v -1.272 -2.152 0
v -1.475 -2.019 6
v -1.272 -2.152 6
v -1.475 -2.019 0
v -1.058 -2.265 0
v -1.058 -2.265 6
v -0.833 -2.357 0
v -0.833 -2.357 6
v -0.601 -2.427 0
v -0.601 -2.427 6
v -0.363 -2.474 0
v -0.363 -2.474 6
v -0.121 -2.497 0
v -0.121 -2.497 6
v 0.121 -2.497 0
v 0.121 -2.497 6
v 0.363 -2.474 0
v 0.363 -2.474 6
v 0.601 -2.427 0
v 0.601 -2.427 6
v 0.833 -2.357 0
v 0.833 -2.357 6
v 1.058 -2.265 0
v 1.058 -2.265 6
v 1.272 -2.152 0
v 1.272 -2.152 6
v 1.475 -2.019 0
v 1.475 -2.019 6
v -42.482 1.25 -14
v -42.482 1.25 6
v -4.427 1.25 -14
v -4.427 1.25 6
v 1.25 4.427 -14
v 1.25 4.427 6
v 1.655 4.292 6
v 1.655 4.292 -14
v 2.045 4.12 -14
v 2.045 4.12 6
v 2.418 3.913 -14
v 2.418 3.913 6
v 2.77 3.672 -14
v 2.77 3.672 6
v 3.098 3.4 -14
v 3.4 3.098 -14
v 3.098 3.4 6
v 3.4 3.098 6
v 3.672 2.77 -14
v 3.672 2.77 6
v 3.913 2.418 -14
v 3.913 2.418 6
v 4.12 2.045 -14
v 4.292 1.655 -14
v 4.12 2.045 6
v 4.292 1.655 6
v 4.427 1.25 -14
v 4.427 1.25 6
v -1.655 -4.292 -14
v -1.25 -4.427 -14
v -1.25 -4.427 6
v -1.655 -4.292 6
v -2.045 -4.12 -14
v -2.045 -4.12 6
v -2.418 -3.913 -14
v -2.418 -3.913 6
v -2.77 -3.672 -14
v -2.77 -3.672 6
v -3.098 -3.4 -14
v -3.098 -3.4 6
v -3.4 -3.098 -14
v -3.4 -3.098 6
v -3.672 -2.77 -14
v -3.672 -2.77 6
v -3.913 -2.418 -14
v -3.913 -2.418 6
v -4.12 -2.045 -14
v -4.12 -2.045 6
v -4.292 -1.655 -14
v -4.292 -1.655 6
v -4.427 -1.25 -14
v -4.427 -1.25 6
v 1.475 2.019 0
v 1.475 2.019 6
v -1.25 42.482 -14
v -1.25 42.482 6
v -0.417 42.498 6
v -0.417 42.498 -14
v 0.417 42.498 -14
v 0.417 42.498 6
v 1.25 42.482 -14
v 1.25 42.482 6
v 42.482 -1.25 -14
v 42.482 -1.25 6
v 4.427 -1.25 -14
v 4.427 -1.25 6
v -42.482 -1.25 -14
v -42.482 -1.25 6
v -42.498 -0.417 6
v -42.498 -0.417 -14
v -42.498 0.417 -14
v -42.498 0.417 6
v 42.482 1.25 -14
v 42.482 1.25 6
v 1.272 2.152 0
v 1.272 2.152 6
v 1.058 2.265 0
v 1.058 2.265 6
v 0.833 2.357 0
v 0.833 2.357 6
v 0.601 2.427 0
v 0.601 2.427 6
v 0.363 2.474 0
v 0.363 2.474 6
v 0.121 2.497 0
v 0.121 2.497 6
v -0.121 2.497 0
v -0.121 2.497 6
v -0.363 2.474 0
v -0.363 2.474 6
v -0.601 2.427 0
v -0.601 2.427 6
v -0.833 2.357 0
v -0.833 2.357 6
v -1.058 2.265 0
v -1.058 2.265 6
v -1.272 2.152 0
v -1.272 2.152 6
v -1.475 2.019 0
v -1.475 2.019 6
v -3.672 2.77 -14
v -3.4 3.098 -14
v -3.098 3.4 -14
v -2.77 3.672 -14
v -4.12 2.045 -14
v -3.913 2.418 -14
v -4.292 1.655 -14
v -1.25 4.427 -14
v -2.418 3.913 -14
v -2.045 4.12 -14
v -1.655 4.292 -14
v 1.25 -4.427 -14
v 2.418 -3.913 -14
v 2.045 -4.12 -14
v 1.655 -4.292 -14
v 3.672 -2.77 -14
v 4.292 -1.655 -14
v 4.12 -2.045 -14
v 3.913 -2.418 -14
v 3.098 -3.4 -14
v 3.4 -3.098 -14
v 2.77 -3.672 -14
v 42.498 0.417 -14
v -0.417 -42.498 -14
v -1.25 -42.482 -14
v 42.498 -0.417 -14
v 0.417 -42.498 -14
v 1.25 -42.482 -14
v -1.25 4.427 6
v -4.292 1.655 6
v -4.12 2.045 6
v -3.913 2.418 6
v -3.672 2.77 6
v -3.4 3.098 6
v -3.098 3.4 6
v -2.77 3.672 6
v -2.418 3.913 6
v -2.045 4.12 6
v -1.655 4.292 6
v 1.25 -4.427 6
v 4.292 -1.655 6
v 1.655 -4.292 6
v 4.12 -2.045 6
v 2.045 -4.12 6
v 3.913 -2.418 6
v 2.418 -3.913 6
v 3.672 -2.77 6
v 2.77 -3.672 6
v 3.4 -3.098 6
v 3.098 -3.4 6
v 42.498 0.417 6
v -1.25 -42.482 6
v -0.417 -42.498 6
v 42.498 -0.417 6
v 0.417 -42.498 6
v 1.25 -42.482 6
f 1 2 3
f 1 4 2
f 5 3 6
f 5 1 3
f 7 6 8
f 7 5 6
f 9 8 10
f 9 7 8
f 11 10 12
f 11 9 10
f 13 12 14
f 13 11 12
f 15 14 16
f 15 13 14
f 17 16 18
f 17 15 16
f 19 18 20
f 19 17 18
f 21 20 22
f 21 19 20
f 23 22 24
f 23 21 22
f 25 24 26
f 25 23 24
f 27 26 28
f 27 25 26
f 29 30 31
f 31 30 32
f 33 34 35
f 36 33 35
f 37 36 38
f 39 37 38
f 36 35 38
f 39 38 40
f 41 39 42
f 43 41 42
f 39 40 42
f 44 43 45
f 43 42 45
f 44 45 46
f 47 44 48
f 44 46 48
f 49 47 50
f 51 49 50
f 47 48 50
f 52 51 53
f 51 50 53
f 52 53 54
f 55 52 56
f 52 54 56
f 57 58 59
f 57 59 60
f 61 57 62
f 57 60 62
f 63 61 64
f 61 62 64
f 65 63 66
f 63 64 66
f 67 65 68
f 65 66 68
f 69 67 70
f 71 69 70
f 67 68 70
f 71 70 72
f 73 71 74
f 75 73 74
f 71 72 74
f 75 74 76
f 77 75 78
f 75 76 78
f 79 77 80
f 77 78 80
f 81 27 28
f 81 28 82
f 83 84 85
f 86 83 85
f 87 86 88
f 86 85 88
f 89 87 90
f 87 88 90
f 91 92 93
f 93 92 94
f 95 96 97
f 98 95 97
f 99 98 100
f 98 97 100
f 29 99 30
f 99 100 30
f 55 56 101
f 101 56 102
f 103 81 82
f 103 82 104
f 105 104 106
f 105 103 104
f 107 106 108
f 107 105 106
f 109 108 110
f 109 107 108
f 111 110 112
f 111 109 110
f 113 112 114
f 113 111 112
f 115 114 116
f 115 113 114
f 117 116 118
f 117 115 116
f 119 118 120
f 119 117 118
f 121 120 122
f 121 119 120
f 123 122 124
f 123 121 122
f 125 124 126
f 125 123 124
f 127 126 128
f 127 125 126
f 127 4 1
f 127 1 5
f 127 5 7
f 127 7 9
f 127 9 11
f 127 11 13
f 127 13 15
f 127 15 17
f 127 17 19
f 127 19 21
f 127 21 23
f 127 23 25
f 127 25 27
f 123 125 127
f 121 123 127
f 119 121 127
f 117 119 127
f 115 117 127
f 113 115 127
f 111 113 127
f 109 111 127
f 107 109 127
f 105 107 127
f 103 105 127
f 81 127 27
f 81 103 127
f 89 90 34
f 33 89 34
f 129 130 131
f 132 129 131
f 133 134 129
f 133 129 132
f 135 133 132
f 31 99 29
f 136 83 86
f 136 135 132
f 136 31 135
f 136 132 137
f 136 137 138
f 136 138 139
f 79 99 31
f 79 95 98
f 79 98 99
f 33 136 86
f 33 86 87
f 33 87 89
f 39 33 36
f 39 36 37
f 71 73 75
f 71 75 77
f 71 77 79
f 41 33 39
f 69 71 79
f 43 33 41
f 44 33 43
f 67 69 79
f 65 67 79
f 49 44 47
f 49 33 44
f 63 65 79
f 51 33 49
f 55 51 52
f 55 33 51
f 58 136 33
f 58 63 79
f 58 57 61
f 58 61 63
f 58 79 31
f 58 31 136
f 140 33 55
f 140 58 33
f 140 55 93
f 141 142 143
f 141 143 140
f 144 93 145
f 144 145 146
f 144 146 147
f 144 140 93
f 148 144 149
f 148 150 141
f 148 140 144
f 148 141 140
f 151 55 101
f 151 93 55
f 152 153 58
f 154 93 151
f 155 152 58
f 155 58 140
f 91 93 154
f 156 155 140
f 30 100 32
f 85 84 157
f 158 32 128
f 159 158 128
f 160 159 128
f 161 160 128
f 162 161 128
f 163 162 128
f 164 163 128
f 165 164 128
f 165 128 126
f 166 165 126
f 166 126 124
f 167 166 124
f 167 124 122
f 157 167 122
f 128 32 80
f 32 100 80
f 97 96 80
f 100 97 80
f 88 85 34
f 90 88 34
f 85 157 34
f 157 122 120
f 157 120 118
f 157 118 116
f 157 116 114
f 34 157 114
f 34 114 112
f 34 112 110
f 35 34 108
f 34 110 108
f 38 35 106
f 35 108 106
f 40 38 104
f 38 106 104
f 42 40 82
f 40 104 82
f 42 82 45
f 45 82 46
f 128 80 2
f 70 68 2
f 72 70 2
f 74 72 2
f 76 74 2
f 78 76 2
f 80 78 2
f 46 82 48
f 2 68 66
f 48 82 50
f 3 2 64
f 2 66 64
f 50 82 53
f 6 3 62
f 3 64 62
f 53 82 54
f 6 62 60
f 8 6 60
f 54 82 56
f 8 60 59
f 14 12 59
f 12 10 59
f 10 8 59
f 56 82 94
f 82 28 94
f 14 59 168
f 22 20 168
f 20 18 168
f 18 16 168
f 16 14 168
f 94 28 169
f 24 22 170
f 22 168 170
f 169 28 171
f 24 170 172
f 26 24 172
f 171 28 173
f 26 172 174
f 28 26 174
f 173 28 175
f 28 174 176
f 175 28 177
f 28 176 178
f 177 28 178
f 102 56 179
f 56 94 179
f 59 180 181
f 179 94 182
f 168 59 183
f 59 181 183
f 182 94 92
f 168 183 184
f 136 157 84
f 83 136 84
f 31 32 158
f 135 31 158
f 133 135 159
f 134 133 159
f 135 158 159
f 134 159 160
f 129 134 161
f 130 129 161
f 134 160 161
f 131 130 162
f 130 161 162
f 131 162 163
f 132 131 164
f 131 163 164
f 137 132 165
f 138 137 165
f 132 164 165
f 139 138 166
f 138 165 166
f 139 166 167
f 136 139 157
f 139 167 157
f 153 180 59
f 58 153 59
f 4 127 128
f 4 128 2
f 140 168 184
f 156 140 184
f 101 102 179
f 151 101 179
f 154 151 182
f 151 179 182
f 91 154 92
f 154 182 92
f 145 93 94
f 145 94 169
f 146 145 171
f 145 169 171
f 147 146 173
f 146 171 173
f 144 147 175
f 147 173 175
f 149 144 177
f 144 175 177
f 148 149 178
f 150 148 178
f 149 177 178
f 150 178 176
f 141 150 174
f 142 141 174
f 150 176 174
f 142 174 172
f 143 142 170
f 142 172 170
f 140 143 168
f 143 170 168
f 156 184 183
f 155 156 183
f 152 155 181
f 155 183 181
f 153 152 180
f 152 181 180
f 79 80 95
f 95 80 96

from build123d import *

# Parameters (mm, degrees)
F0_R      = 2.5
F1_DEPTH  = 8
F3_DEPTH  = 6
F4_R      = 4.6
F4_R_2    = 2.5
F5_DEPTH  = 1.5
F6_R      = 14
F7_DEPTH  = 19.2
F9_DEPTH  = 16.5
F11_DEPTH = 20


with BuildPart() as f1:
    # F0 (on Top) → F1 (new body)
    with BuildSketch(Plane.XY):
        Circle(F0_R)
    extrude(amount=F1_DEPTH)

    # F2 (on face) → F3 (cut)
    with BuildSketch(Plane(origin=(0, 0, 0), x_dir=(1, 0, 0), z_dir=(0, 0, -1))):
        with BuildLine():
            Line((-1.475, -2.018508), (-1.475, 2.018508))
            ThreePointArc((-1.475, 2.018508), (-2.5, 0), (-1.475, -2.018508))
        make_face()
        with BuildLine():
            ThreePointArc((1.475, -2.018508), (2.5, 0), (1.475, 2.018508))
            Line((1.475, 2.018508), (1.475, -2.018508))
        make_face()
    extrude(amount=-F3_DEPTH, mode=Mode.SUBTRACT)

    # F4 (on face) → F5 (join)
    with BuildSketch(Plane.XY.offset(8)):
        Circle(F4_R)
        Circle(F4_R_2, mode=Mode.SUBTRACT)
        Circle(F4_R_2)
    extrude(amount=F5_DEPTH)

    # F6 (on face) → F7 (join)
    with BuildSketch(Plane.XY.offset(9.5)):
        with Locations((0, 7.6)):
            Circle(F6_R)
    extrude(amount=F7_DEPTH)

    # F8 (on face) → F9 (join)
    with BuildSketch(Plane(origin=(0, 0, 9.5), x_dir=(1, 0, 0), z_dir=(0, 0, -1))):
        with BuildLine():
            ThreePointArc((7.25, -19.57654), (0, -21.6), (-7.25, -19.57654))
            Line((-7.25, -19.57654), (-7.25, -24.07654))
            Line((-7.25, -24.07654), (7.25, -24.07654))
            Line((7.25, -24.07654), (7.25, -19.57654))
        make_face()
    extrude(amount=-F9_DEPTH)


with BuildPart() as f11:
    # F10 (on face) → F11 (new body)
    with BuildSketch(Plane(origin=(0, 0, 6), x_dir=(1, 0, 0), z_dir=(0, 0, -1))):
        with BuildLine():
            Line((-1.25, -4.426906), (-1.25, -42.481614))
            ThreePointArc((-1.25, -42.481614), (0, -42.5), (1.25, -42.481614))
            Line((1.25, -42.481614), (1.25, -4.426906))
            ThreePointArc((1.25, -4.426906), (3.252642, -3.252741), (4.426868, -1.250135))
            Line((4.426868, -1.250135), (42.48161, -1.250135))
            ThreePointArc((42.48161, -1.250135), (42.5, -0.000135), (42.481618, 1.249865))
            Line((42.481618, 1.249865), (4.426945, 1.249865))
            ThreePointArc((4.426945, 1.249865), (3.252741, 3.252642), (1.25, 4.426906))
            Line((1.25, 4.426906), (1.25, 42.481614))
            ThreePointArc((1.25, 42.481614), (0, 42.5), (-1.25, 42.481614))
            Line((-1.25, 42.481614), (-1.25, 4.426906))
            ThreePointArc((-1.25, 4.426906), (-3.252741, 3.252642), (-4.426945, 1.249865))
            Line((-4.426945, 1.249865), (-42.481618, 1.249865))
            ThreePointArc((-42.481618, 1.249865), (-42.5, -0.000135), (-42.48161, -1.250135))
            Line((-42.48161, -1.250135), (-4.426868, -1.250135))
            ThreePointArc((-4.426868, -1.250135), (-3.252642, -3.252741), (-1.25, -4.426906))
        make_face()
    extrude(amount=F11_DEPTH)

    # F12: cut F1
    add(f1.part, mode=Mode.SUBTRACT)


solid = f11.part
